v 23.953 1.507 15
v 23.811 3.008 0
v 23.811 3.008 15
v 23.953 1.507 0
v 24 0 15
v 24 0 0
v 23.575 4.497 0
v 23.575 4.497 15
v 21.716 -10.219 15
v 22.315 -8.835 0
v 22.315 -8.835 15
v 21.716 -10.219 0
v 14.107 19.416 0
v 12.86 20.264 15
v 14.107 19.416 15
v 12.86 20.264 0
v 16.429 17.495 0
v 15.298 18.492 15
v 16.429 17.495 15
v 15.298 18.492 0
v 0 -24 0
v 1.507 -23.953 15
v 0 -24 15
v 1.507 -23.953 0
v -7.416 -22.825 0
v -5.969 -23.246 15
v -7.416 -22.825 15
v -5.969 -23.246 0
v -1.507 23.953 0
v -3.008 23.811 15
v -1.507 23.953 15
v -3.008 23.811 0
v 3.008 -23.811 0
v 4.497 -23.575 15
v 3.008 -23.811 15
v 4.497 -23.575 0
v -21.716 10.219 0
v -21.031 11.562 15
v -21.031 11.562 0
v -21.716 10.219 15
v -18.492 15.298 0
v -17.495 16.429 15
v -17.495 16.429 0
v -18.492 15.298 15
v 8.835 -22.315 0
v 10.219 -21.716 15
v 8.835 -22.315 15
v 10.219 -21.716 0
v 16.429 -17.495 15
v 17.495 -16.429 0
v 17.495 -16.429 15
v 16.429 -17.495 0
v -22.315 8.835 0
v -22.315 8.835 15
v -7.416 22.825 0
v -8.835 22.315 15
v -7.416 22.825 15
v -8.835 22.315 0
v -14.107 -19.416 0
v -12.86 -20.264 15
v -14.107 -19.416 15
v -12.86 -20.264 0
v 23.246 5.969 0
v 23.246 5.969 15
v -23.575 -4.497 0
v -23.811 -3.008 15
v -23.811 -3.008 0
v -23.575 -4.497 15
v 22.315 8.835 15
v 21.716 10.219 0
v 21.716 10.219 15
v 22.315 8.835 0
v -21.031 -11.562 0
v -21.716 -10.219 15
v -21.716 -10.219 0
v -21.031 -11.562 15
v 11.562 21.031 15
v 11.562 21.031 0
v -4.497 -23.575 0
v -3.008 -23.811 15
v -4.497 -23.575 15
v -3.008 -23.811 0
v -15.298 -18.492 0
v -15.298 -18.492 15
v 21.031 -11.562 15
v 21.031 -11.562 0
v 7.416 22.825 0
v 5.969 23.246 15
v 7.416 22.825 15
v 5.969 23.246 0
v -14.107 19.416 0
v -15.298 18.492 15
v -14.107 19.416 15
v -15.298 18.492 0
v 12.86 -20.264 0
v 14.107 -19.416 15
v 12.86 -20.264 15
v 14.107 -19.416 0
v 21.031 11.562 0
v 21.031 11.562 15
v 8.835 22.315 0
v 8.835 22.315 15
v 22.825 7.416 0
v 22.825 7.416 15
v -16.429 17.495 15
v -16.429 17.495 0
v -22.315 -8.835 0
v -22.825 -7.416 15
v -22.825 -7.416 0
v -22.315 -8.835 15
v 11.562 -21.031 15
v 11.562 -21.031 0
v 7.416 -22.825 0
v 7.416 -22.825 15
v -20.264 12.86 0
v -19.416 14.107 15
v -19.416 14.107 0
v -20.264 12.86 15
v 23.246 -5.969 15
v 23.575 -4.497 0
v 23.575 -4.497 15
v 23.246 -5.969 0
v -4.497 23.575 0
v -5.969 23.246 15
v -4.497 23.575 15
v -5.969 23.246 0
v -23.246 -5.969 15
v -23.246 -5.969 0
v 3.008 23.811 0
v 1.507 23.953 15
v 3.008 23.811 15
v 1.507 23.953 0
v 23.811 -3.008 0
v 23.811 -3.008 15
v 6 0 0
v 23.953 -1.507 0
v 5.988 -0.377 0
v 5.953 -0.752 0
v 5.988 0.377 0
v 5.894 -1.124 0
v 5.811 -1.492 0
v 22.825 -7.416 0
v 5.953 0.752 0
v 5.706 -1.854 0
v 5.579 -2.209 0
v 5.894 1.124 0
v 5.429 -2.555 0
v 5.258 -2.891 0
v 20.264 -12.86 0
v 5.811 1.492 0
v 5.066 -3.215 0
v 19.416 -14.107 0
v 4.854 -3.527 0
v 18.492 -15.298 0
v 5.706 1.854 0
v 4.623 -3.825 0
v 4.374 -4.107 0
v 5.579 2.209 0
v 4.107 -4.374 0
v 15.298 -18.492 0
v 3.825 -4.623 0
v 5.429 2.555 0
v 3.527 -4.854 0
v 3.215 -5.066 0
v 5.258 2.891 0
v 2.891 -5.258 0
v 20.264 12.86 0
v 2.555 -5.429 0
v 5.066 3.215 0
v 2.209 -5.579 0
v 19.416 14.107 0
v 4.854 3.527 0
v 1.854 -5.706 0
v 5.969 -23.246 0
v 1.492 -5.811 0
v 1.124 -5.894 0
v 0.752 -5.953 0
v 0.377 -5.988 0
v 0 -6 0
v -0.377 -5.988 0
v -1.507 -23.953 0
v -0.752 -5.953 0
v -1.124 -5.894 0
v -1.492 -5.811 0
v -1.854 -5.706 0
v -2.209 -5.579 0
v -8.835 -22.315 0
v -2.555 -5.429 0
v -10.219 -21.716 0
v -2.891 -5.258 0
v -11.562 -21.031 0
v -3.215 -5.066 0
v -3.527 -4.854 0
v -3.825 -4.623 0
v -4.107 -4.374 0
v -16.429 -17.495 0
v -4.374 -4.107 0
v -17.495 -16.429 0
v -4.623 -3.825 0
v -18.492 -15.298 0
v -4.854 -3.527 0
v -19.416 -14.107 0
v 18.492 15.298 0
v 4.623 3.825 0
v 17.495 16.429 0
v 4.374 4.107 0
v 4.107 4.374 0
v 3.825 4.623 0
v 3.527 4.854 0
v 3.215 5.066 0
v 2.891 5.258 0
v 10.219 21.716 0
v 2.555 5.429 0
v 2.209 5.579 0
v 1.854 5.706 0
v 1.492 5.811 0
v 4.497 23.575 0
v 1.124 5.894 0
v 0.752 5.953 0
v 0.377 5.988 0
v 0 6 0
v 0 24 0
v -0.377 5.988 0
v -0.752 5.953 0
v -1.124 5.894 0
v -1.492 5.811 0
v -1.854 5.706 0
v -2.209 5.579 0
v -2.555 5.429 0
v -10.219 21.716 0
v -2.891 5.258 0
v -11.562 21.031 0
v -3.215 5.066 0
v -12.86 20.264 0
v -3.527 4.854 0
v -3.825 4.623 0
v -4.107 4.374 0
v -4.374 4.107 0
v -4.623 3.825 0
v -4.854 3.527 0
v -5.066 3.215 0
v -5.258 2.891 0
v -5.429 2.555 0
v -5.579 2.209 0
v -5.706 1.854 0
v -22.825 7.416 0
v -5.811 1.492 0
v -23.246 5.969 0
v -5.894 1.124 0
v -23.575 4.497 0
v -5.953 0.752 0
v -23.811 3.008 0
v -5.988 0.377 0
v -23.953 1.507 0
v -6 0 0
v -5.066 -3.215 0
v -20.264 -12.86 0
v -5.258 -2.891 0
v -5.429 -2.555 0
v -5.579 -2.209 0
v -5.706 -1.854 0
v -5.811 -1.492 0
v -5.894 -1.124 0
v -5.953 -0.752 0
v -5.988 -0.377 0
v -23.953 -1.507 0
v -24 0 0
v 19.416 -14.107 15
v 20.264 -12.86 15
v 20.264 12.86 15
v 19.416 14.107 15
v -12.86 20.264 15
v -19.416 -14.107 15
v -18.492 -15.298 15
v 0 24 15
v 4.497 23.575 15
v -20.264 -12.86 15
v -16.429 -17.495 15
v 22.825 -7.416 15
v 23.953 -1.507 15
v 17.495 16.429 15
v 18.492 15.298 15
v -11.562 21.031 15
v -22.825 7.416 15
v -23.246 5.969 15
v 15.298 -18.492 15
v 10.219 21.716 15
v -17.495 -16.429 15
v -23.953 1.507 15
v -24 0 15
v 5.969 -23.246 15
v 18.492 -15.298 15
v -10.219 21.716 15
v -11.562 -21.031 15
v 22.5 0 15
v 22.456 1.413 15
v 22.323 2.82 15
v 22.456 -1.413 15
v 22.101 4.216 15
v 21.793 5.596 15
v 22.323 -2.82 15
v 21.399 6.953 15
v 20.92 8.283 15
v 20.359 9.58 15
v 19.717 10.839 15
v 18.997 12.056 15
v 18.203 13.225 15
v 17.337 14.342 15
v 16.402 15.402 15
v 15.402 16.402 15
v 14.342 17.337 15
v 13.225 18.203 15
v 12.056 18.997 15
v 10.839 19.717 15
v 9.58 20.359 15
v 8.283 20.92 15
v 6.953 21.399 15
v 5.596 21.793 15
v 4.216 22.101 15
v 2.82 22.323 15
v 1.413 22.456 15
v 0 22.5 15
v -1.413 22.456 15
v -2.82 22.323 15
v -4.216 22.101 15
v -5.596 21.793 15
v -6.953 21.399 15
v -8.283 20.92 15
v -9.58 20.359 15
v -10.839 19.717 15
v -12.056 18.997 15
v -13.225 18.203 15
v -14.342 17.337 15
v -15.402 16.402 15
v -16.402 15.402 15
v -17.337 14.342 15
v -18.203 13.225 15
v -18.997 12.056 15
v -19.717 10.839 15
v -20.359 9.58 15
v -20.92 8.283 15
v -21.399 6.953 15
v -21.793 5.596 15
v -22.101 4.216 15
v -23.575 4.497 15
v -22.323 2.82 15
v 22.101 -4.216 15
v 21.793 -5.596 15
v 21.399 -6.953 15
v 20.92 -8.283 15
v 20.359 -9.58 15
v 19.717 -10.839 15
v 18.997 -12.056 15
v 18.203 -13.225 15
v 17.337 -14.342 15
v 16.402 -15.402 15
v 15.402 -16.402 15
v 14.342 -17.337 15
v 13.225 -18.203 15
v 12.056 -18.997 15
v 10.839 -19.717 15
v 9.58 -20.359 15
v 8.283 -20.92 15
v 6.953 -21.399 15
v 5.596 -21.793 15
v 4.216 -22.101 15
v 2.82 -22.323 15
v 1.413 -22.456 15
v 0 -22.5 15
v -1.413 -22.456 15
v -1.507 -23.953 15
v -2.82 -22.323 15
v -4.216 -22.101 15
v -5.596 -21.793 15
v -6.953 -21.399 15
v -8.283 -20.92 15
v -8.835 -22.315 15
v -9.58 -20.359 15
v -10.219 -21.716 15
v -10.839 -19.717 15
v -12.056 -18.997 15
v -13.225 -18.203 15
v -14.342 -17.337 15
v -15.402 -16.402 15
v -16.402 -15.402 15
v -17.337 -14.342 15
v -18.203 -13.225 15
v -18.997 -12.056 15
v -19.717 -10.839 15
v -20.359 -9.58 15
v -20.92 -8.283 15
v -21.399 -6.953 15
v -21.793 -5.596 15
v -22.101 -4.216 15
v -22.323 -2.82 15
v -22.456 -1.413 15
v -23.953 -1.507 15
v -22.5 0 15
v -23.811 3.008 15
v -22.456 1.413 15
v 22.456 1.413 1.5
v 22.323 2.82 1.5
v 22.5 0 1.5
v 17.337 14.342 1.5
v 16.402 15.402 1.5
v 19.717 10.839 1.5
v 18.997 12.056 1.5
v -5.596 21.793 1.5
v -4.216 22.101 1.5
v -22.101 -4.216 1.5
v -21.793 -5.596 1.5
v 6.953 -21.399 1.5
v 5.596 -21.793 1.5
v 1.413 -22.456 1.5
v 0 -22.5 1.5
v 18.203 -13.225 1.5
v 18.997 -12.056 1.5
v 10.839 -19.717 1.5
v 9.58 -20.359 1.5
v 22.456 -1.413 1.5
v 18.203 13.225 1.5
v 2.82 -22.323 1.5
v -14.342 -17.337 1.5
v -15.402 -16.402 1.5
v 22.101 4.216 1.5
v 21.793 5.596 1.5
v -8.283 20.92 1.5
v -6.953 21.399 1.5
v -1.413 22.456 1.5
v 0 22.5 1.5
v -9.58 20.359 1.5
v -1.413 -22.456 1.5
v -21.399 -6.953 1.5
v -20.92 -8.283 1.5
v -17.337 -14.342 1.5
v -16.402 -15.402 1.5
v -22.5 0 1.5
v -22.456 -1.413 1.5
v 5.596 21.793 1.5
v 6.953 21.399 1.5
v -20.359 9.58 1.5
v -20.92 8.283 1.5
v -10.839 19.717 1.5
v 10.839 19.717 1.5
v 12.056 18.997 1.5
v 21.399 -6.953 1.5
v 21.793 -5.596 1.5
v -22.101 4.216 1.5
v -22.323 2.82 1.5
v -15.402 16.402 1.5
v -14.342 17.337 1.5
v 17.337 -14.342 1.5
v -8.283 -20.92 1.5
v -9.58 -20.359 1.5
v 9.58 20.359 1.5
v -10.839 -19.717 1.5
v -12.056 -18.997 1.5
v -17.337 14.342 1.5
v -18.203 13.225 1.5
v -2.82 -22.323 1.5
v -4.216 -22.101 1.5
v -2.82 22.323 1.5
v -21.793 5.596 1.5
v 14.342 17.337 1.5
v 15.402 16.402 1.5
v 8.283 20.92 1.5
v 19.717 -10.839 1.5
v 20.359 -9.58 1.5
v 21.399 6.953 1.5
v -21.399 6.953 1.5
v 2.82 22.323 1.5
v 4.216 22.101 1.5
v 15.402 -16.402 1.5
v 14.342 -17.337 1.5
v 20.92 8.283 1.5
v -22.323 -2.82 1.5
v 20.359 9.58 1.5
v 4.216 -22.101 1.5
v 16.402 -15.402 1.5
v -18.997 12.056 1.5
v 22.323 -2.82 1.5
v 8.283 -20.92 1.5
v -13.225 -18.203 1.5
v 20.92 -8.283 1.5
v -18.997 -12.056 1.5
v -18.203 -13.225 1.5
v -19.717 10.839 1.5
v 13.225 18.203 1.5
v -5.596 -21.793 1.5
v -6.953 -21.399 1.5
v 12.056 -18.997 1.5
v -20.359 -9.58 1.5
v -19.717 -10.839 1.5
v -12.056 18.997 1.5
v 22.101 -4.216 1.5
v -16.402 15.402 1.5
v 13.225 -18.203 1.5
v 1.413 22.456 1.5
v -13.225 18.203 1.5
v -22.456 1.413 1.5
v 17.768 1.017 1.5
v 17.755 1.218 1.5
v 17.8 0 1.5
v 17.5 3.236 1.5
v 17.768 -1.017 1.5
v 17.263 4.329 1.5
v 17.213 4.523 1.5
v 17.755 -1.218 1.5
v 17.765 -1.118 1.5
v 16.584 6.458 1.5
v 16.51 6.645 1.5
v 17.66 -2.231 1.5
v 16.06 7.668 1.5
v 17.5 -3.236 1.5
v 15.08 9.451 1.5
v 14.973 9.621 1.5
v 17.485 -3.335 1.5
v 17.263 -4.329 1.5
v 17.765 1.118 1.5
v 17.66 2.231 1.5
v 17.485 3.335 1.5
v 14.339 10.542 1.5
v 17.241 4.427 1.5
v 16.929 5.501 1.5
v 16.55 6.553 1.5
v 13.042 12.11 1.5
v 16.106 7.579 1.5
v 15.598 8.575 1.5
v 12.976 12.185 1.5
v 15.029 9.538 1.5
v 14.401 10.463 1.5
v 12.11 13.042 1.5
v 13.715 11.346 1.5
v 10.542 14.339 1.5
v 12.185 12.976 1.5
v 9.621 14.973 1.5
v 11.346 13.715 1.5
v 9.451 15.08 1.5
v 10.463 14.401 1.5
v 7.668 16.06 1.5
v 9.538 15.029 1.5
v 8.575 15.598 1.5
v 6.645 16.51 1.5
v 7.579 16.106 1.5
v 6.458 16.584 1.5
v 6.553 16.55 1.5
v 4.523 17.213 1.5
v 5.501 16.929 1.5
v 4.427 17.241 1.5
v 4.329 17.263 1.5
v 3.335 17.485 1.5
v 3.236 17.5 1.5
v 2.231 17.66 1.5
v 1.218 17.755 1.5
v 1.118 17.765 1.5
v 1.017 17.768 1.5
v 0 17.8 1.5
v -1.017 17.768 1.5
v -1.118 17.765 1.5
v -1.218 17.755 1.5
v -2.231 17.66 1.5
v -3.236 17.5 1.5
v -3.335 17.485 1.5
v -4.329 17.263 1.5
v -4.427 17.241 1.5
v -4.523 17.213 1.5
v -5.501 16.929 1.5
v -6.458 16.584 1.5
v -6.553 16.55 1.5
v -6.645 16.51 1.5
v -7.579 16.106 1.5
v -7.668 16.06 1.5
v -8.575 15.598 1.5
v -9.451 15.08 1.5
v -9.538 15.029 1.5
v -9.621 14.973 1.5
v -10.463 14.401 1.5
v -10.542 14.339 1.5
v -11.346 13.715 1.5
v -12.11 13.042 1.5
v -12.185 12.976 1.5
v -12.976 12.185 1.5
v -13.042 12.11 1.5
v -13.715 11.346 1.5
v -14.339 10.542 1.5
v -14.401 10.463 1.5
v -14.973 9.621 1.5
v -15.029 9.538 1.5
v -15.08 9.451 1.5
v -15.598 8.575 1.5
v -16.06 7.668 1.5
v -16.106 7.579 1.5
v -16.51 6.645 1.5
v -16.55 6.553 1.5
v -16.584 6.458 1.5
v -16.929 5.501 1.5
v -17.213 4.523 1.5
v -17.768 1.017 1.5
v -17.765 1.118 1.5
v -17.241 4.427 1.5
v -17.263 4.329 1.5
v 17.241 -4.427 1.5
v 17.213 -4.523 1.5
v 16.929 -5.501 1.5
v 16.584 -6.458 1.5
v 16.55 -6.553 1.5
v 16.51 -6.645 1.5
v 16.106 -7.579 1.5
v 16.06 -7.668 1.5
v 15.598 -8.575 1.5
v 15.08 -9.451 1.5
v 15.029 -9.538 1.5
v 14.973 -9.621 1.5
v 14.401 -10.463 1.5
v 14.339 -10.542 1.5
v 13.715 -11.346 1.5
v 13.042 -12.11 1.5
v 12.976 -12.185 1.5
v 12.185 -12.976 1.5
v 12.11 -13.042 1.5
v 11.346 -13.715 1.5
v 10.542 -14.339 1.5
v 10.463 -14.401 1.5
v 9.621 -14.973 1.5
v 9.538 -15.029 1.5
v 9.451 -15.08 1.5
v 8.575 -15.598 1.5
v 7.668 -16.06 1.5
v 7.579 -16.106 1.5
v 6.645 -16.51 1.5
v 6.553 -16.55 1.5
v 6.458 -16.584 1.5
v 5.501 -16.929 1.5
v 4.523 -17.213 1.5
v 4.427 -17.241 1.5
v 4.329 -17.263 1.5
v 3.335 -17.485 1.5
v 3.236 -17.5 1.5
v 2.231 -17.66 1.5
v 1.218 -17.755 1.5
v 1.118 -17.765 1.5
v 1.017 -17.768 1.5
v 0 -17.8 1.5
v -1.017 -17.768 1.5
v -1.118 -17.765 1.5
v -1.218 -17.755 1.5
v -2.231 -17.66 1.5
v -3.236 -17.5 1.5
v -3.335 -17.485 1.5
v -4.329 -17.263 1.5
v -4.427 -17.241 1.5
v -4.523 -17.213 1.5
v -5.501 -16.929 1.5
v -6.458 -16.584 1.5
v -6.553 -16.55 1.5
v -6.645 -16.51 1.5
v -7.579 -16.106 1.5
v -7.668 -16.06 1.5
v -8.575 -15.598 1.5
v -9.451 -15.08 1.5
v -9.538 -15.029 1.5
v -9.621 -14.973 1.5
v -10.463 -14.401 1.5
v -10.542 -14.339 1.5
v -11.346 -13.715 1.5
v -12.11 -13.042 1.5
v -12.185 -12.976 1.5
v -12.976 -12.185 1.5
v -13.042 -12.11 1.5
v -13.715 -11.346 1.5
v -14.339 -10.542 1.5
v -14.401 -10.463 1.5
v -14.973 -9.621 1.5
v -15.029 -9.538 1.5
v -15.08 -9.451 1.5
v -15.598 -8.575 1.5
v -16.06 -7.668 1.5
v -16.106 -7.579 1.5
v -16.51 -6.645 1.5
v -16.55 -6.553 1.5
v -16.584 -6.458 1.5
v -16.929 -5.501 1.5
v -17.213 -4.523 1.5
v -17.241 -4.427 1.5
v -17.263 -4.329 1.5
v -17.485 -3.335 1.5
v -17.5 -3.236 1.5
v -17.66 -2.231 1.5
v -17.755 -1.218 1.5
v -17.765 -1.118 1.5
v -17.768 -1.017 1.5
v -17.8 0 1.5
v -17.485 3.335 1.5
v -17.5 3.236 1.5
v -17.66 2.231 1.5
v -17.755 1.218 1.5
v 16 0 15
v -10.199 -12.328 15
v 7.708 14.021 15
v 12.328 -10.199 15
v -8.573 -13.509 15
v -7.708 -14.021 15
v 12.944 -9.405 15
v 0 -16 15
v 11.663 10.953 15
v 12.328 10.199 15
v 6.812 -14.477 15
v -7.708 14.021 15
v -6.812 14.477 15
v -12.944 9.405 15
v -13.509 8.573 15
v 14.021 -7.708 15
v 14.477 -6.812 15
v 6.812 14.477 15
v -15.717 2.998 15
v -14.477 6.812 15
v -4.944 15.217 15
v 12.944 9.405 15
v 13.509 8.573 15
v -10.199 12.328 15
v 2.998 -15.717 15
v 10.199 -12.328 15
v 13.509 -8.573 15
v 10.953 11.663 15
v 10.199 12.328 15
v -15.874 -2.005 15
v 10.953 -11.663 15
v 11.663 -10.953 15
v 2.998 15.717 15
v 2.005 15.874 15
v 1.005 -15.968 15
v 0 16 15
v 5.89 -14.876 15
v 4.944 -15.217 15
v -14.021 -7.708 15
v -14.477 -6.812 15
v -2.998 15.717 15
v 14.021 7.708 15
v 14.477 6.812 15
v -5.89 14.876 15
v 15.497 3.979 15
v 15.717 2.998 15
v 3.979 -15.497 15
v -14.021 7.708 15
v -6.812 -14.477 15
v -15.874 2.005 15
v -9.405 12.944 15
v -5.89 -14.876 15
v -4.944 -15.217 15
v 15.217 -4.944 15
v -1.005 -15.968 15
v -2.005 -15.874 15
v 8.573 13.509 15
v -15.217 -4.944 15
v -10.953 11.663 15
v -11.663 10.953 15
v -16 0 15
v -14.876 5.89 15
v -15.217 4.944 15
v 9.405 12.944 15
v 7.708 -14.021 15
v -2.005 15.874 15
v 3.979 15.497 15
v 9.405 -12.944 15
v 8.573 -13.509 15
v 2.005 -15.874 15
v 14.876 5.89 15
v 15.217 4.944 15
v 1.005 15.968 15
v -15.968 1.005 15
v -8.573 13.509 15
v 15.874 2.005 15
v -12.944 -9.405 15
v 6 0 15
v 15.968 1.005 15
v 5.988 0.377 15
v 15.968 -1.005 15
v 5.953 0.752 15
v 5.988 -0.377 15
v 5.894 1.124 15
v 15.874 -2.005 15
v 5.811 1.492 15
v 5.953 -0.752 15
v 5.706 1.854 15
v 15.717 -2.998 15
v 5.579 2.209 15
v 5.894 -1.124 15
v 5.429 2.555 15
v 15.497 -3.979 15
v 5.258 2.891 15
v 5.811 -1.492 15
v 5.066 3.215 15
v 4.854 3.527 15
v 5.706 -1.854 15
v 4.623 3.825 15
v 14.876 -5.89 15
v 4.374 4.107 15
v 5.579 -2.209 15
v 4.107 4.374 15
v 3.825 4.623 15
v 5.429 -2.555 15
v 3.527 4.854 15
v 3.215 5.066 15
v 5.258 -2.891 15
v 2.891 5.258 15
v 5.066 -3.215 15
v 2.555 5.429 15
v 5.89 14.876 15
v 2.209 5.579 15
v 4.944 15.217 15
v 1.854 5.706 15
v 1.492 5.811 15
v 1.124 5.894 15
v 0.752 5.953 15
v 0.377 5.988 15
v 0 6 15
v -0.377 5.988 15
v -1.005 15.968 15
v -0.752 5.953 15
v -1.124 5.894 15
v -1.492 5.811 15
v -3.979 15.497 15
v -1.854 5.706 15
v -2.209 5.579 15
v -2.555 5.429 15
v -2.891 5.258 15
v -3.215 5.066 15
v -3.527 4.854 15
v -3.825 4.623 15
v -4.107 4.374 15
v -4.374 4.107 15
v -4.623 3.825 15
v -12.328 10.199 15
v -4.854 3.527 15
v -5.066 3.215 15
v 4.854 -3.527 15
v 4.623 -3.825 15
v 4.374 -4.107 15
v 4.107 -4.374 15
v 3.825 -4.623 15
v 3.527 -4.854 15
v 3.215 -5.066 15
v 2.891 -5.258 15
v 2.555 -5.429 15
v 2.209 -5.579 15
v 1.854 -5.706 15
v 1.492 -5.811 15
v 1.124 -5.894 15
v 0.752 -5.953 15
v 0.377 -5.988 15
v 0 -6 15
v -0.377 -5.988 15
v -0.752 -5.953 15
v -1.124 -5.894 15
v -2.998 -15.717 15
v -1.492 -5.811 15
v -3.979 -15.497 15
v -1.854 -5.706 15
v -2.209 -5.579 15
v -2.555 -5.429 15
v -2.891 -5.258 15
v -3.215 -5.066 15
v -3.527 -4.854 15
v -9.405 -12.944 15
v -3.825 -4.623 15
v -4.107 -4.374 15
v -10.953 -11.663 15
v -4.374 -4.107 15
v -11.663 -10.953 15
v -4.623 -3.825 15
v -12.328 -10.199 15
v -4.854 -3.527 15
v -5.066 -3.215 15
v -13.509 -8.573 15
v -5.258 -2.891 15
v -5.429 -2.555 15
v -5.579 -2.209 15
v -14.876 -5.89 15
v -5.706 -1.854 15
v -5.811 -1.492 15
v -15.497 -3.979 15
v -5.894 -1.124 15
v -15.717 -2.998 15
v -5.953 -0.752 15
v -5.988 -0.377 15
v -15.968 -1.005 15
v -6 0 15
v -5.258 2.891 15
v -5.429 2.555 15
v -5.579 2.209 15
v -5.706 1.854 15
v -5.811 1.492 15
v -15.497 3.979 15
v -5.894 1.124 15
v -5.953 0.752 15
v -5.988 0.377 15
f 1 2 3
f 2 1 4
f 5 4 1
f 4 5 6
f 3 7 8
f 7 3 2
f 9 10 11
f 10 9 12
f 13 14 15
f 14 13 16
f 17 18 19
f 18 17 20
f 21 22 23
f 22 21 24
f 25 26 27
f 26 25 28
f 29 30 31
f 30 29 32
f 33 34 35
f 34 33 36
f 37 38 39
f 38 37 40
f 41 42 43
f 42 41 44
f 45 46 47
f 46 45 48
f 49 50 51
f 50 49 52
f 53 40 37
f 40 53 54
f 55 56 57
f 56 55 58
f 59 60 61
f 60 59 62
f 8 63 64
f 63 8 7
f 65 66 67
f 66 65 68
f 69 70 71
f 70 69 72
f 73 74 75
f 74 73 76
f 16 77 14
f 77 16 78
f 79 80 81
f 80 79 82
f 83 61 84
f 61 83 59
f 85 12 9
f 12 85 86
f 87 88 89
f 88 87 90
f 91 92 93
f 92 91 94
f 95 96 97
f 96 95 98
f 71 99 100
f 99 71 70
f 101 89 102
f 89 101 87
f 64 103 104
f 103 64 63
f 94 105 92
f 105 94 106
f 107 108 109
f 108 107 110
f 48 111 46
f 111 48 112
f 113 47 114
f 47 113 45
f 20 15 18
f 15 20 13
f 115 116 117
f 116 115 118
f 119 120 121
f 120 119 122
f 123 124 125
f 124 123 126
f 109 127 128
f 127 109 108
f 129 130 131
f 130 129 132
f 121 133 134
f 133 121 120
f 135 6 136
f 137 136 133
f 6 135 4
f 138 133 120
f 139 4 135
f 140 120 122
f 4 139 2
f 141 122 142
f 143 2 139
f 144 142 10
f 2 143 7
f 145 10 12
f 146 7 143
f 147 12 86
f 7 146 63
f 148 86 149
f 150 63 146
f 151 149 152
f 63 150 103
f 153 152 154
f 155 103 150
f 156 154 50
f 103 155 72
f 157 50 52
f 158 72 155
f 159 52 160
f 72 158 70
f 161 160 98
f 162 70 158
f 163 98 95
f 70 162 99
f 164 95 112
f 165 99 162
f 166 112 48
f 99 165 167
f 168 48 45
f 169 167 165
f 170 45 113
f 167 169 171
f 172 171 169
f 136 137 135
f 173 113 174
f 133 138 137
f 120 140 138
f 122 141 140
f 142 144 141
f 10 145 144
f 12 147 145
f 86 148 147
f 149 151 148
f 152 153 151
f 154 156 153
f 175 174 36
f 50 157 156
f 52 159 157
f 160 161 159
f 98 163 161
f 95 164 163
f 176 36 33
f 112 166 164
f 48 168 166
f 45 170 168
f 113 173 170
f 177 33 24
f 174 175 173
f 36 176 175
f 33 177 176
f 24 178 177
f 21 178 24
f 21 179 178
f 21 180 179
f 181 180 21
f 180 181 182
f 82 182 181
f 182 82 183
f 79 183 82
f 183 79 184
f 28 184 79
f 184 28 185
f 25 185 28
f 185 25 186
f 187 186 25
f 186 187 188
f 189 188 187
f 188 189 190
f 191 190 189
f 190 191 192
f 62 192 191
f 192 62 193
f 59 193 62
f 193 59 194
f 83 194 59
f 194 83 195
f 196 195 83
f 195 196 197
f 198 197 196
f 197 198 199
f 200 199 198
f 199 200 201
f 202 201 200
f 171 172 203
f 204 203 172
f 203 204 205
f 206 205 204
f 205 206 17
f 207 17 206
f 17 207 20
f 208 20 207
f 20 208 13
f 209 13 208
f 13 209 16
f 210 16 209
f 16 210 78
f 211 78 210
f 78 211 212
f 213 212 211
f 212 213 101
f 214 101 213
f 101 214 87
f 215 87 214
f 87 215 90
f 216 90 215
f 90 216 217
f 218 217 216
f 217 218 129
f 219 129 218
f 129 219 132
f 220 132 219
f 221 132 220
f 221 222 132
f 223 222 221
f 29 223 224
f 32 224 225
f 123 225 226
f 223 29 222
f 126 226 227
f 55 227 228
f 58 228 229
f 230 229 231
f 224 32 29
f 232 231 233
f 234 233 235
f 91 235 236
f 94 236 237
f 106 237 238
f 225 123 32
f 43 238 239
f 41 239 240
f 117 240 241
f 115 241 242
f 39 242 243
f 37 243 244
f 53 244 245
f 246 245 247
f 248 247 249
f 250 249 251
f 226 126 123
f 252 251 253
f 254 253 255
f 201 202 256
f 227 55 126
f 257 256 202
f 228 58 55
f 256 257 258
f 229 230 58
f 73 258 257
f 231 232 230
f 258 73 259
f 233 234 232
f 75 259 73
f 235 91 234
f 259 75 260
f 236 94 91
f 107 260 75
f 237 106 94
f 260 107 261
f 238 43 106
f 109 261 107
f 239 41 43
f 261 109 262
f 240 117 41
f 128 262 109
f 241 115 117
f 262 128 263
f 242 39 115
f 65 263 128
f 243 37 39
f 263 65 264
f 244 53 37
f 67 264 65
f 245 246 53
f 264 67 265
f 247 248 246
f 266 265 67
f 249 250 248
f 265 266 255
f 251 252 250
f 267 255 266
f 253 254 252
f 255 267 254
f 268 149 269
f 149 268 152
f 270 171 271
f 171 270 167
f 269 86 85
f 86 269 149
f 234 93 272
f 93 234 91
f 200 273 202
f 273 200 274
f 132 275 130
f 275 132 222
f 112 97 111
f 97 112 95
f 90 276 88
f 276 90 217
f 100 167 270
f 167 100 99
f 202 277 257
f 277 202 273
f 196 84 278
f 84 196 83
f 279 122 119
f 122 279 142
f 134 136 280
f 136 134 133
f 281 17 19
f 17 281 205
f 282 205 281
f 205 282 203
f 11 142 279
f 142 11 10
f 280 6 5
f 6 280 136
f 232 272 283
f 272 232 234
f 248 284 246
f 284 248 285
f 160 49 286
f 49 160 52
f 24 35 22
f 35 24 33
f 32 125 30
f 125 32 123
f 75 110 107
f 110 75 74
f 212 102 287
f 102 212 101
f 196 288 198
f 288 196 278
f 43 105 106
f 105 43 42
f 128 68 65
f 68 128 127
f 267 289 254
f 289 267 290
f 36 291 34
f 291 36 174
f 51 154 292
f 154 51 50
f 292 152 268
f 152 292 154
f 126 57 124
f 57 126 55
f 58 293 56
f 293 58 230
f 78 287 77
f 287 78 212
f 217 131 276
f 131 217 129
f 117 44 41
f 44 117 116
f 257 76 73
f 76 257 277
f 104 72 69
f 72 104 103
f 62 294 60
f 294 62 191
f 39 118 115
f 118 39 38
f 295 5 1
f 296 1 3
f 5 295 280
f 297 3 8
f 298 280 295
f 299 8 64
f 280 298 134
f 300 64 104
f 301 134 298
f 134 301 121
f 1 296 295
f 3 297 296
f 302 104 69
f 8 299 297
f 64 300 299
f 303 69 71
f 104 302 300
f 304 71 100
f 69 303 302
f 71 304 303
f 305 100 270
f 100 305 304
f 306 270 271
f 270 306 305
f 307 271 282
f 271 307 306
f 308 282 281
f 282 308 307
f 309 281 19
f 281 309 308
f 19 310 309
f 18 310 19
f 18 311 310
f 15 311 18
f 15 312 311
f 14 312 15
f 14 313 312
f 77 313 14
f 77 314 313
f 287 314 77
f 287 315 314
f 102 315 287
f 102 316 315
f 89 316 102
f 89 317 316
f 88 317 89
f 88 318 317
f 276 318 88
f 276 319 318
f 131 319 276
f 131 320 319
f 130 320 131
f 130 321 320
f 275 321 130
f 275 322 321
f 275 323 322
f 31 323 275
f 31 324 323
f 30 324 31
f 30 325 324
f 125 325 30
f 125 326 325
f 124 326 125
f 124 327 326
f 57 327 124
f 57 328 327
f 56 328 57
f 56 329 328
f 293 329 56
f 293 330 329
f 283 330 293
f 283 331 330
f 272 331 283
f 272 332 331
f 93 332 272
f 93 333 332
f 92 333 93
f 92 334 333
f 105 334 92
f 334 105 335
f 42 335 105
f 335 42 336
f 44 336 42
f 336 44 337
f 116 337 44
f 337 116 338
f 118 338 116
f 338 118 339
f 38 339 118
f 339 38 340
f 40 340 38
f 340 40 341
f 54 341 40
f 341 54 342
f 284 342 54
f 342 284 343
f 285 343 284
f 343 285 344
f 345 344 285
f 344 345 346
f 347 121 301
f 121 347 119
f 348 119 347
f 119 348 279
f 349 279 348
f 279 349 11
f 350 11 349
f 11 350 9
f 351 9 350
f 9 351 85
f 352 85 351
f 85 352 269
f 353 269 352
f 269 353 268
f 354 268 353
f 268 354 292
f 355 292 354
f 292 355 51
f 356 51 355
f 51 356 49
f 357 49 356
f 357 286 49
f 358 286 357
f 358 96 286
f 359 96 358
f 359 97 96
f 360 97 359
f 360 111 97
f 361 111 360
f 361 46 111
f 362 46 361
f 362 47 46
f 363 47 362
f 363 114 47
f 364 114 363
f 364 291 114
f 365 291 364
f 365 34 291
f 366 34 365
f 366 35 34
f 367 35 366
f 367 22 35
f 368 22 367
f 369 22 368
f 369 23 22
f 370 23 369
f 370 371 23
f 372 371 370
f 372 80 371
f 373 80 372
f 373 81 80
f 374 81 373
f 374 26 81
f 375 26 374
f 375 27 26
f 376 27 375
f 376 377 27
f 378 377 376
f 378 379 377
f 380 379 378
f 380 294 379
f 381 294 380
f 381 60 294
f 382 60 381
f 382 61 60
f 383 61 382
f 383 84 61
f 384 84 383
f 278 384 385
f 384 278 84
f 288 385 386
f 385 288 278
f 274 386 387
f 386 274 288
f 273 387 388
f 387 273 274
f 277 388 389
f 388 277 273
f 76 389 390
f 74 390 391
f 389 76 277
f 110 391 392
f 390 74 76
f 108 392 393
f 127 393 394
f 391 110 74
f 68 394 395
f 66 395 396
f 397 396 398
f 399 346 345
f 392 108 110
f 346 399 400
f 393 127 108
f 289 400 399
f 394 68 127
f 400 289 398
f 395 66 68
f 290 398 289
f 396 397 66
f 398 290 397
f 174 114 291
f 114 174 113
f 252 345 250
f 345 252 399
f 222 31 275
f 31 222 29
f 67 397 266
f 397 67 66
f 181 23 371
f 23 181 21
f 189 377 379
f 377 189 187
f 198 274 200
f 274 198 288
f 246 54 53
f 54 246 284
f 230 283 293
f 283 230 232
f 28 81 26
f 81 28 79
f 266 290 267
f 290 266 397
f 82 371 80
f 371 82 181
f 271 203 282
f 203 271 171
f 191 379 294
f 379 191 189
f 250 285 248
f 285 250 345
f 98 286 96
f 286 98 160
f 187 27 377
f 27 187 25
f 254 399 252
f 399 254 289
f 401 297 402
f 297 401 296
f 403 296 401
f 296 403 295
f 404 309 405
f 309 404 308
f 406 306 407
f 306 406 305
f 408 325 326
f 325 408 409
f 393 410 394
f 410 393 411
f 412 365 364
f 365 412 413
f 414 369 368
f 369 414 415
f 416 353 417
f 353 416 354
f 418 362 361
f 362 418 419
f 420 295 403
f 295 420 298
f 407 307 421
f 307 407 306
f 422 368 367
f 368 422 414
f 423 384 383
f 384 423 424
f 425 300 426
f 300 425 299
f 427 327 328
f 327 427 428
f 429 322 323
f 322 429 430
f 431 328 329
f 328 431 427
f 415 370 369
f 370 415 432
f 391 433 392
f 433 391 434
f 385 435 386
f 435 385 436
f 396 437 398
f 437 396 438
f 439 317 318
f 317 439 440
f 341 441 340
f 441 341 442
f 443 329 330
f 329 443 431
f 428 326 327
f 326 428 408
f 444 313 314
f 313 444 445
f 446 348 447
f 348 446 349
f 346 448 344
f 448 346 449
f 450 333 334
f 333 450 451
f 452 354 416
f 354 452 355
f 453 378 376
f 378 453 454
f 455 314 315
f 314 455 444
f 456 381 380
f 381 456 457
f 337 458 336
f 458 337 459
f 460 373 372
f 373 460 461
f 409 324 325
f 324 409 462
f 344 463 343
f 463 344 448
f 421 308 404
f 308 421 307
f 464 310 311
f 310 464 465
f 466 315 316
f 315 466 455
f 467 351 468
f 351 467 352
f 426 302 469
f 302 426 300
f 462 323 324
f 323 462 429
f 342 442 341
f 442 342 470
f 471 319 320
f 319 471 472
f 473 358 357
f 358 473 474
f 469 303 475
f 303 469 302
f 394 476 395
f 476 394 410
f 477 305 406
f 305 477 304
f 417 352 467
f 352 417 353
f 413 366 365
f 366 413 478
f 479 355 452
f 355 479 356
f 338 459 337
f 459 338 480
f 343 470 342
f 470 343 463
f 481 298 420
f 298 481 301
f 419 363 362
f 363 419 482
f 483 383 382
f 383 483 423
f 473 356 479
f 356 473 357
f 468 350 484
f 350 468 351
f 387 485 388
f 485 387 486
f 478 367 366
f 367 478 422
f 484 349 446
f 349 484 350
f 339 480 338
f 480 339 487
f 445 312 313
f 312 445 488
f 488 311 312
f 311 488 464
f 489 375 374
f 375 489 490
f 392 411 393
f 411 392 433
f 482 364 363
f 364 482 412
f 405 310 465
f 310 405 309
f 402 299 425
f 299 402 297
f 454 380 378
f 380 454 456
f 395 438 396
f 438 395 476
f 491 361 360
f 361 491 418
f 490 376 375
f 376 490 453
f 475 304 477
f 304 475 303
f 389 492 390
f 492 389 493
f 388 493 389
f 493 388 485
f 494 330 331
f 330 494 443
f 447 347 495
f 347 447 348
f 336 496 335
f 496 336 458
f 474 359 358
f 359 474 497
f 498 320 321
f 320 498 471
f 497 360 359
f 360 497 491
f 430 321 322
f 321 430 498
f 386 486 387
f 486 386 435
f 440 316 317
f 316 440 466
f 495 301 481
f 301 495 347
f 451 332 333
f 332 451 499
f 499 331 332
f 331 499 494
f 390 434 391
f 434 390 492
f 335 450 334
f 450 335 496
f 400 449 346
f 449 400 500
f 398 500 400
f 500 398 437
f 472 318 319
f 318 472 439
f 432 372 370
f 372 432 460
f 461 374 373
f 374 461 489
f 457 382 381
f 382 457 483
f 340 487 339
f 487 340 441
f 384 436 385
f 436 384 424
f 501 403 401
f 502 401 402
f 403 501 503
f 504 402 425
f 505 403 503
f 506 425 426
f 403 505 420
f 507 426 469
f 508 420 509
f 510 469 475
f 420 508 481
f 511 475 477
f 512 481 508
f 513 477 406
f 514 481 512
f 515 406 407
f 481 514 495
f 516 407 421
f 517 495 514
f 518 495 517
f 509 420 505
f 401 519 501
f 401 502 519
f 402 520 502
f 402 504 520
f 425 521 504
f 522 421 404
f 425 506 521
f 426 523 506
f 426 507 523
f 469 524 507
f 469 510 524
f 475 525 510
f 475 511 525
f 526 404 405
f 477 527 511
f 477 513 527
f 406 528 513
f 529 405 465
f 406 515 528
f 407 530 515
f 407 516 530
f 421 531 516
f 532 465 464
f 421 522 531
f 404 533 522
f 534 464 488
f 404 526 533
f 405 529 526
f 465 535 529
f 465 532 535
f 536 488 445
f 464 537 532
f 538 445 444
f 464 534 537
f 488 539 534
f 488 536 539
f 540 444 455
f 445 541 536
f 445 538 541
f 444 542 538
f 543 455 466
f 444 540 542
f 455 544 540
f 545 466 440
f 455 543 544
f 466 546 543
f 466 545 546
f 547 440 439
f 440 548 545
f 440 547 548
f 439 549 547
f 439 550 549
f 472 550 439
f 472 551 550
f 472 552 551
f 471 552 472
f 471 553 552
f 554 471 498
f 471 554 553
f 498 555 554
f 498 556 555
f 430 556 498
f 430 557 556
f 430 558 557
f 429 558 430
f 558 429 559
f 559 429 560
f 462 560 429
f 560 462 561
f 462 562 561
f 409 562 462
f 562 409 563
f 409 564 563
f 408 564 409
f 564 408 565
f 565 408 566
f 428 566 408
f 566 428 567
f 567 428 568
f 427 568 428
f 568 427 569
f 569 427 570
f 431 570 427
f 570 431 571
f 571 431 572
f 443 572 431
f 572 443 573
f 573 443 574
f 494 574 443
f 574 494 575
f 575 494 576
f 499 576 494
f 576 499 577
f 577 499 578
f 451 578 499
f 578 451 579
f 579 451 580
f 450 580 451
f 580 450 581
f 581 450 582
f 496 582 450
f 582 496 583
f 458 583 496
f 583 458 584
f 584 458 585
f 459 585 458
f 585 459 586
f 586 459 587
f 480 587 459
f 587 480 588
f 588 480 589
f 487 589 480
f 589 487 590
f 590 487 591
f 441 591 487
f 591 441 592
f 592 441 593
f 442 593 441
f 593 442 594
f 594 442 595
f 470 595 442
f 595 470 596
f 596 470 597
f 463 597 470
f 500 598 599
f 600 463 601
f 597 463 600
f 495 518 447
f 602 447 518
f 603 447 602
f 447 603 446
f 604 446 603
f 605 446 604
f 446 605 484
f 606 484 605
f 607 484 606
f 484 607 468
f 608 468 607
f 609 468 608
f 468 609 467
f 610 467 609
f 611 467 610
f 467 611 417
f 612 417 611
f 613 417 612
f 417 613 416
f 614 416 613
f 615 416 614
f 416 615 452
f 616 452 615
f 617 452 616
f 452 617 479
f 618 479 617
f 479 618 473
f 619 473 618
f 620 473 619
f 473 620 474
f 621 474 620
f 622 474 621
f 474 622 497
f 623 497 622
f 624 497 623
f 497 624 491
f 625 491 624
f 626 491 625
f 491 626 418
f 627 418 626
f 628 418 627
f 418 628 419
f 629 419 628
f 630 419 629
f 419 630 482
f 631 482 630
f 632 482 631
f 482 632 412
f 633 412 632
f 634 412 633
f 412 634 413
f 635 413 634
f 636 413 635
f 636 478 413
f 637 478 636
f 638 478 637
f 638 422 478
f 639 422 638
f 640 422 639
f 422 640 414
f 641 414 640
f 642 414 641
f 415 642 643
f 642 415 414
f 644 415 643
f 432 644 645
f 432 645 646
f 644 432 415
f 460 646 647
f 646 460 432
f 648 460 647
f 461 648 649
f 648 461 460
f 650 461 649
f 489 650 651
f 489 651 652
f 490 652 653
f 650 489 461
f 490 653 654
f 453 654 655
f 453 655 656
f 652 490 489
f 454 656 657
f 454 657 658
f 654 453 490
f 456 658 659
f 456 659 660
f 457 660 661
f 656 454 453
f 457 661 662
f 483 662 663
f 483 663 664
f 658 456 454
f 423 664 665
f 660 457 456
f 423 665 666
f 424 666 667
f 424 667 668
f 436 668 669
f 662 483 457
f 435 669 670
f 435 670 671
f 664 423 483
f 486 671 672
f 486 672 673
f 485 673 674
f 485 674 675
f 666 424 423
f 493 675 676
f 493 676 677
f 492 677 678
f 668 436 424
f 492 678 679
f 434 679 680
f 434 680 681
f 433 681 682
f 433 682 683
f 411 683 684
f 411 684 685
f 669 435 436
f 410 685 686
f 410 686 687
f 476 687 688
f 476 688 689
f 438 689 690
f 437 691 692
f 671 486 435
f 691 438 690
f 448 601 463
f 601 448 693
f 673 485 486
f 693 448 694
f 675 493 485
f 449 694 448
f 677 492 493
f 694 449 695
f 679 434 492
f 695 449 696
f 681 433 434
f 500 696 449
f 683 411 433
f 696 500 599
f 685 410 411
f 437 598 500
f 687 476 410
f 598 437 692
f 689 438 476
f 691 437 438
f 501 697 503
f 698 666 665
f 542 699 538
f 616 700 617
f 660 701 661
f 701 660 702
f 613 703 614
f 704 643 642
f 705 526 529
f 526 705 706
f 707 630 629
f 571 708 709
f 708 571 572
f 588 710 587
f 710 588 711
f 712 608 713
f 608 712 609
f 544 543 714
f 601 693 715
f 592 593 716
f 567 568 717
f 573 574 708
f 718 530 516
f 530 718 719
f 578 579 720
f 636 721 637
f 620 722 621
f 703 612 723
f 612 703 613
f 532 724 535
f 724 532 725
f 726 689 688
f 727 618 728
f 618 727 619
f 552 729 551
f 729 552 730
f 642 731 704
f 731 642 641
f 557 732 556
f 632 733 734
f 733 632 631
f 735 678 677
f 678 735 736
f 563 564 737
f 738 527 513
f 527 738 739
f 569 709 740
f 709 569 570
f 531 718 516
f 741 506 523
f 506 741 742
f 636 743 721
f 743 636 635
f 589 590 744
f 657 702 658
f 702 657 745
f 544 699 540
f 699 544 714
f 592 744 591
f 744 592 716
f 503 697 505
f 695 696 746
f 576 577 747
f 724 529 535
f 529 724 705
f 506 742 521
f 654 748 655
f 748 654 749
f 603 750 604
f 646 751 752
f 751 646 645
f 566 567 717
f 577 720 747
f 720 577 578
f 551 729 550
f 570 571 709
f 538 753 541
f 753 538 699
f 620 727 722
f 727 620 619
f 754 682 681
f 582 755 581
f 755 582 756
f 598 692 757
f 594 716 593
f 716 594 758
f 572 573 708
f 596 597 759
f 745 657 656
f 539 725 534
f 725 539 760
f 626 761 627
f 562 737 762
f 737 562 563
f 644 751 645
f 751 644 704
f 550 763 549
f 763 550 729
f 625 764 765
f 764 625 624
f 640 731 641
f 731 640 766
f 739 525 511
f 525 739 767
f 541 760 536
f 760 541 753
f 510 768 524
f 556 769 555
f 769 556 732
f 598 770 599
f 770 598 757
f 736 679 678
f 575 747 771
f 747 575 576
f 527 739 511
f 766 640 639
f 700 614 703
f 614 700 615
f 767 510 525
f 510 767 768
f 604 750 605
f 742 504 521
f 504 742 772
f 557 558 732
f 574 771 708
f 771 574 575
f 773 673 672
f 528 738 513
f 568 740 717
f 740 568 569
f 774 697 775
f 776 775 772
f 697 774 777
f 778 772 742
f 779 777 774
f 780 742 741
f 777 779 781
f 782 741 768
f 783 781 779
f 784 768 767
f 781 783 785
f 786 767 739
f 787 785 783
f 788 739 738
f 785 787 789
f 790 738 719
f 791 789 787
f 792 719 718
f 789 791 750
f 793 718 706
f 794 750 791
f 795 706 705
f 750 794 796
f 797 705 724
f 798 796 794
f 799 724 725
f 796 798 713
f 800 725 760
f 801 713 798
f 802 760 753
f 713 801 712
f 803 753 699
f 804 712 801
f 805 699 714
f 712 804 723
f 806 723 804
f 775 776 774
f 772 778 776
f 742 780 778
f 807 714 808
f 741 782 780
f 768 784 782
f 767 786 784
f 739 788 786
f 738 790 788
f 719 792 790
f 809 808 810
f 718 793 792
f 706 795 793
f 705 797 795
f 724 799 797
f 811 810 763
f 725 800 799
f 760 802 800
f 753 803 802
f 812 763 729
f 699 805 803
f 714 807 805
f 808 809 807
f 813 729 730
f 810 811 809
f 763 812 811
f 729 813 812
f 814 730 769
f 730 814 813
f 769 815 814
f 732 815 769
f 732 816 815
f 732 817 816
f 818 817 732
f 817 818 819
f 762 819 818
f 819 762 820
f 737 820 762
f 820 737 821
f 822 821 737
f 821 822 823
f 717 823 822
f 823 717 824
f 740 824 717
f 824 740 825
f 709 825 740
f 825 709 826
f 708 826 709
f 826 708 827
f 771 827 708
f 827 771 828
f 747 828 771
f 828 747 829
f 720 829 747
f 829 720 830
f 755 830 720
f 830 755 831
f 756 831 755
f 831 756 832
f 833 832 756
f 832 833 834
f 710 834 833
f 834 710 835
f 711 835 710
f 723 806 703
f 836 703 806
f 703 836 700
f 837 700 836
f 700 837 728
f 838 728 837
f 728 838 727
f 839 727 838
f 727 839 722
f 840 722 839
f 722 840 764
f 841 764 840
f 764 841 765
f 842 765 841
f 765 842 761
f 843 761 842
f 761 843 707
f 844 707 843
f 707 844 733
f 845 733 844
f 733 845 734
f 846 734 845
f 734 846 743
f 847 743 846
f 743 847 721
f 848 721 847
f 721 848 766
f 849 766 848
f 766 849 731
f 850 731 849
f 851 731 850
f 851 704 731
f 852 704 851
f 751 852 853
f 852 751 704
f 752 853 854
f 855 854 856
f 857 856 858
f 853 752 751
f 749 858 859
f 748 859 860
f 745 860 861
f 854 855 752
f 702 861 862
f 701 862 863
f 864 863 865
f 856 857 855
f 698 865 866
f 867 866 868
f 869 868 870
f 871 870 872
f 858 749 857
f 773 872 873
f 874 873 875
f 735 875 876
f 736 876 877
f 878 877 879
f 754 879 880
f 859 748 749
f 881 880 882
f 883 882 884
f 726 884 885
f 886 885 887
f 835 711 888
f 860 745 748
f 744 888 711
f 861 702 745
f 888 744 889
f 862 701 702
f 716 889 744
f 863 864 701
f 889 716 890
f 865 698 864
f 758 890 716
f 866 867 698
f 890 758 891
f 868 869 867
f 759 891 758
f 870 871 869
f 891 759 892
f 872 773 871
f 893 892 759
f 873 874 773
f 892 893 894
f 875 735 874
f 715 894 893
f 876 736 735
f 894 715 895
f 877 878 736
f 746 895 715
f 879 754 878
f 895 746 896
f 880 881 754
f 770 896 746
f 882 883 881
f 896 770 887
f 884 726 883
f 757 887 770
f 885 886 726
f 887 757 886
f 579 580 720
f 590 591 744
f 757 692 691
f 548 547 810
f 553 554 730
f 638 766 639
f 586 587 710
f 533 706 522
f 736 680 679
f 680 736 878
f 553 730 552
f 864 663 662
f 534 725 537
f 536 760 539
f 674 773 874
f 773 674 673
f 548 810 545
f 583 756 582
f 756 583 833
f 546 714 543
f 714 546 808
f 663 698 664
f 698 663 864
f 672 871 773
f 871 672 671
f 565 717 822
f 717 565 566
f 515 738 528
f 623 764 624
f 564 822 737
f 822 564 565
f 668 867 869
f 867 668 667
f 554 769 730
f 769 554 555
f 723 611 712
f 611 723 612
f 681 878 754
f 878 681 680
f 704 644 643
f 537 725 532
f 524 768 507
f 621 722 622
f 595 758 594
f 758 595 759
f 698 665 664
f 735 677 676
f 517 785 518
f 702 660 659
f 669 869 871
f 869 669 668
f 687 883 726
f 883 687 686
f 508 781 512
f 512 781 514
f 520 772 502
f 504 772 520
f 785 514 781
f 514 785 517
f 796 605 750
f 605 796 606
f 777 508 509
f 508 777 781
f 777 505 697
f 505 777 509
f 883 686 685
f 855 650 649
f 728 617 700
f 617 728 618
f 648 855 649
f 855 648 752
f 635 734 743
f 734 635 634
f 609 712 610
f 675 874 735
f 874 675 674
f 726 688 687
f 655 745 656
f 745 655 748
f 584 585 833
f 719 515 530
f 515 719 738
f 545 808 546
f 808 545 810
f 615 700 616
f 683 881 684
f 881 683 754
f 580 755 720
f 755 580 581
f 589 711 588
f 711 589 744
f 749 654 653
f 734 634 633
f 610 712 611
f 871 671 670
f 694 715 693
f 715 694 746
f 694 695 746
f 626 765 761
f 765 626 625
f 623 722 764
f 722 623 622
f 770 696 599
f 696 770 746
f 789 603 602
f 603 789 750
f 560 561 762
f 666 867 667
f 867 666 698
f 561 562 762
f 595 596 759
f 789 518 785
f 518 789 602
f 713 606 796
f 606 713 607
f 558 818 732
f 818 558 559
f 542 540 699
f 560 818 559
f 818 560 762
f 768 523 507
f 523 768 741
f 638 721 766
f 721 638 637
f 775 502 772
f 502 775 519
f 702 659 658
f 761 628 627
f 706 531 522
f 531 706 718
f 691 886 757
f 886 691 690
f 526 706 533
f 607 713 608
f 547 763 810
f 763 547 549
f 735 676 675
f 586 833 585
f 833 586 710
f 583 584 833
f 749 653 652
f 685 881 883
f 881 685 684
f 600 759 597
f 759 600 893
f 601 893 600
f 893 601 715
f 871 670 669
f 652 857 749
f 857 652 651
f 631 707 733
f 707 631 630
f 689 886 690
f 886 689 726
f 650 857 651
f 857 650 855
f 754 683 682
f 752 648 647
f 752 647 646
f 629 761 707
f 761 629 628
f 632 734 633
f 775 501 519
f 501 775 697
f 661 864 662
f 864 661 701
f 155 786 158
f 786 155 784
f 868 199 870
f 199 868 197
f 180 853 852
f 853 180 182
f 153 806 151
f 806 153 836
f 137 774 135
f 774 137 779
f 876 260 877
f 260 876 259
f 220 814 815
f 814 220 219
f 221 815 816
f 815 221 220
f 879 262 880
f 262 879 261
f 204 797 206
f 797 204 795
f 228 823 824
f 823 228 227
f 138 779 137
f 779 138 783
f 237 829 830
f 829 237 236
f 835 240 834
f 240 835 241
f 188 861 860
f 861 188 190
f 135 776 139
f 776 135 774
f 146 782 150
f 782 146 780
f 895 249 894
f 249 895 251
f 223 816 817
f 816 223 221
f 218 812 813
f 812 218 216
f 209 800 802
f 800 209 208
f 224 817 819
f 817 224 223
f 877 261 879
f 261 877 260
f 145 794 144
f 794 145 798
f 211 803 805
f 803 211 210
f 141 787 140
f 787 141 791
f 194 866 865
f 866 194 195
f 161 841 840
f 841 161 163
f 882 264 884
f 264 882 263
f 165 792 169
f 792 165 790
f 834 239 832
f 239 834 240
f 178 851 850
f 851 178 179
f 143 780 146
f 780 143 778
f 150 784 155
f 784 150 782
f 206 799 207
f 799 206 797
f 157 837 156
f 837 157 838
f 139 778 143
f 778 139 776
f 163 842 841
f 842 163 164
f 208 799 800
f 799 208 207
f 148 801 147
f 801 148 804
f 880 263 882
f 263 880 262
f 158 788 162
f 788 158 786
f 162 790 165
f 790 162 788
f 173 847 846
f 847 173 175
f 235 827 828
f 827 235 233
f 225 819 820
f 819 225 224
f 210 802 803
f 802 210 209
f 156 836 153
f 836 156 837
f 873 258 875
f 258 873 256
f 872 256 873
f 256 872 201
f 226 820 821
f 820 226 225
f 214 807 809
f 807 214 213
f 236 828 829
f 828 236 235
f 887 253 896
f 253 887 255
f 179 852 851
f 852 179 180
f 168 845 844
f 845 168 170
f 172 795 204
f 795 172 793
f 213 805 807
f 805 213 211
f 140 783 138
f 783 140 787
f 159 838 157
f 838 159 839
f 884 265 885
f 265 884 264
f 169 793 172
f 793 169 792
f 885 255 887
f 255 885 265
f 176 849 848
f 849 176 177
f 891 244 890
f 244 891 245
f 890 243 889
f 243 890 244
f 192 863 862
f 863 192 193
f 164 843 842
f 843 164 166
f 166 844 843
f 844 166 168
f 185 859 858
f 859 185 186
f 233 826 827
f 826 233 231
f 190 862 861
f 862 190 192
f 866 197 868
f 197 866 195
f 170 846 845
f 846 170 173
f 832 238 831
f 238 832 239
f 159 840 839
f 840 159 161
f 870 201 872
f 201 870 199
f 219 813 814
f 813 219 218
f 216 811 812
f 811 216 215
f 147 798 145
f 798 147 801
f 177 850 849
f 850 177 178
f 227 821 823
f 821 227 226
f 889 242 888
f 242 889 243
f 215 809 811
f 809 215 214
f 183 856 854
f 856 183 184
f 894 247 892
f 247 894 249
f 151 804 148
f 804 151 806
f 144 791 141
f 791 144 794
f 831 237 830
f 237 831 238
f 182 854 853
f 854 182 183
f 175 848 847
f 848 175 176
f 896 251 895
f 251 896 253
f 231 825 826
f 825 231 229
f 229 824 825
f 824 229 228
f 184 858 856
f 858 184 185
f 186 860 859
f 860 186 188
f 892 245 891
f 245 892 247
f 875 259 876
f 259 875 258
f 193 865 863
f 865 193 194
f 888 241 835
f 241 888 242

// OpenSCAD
HEIGHT = 15;
THICKNESS = 1.5;

HOLE_DIA = 12;

CUT_DIA_TOP = 36;
CUT_DIA_BOT = 32;

CAP_OUTER_DIA = 48;
CAP_INNER_DIA = CAP_OUTER_DIA - 2 * THICKNESS;

$fn = 100;

module cap() {
    difference() {
        cylinder(d = CAP_OUTER_DIA, h = HEIGHT);
        translate([0, 0, THICKNESS])
        cylinder(d = CAP_INNER_DIA, h = HEIGHT);
    }
}

difference() {
    union() {
        cap();
        cylinder(d1 = CUT_DIA_TOP, d2 = CUT_DIA_BOT, h = HEIGHT);
    }
    cylinder(d = HOLE_DIA, h = HEIGHT);
}
